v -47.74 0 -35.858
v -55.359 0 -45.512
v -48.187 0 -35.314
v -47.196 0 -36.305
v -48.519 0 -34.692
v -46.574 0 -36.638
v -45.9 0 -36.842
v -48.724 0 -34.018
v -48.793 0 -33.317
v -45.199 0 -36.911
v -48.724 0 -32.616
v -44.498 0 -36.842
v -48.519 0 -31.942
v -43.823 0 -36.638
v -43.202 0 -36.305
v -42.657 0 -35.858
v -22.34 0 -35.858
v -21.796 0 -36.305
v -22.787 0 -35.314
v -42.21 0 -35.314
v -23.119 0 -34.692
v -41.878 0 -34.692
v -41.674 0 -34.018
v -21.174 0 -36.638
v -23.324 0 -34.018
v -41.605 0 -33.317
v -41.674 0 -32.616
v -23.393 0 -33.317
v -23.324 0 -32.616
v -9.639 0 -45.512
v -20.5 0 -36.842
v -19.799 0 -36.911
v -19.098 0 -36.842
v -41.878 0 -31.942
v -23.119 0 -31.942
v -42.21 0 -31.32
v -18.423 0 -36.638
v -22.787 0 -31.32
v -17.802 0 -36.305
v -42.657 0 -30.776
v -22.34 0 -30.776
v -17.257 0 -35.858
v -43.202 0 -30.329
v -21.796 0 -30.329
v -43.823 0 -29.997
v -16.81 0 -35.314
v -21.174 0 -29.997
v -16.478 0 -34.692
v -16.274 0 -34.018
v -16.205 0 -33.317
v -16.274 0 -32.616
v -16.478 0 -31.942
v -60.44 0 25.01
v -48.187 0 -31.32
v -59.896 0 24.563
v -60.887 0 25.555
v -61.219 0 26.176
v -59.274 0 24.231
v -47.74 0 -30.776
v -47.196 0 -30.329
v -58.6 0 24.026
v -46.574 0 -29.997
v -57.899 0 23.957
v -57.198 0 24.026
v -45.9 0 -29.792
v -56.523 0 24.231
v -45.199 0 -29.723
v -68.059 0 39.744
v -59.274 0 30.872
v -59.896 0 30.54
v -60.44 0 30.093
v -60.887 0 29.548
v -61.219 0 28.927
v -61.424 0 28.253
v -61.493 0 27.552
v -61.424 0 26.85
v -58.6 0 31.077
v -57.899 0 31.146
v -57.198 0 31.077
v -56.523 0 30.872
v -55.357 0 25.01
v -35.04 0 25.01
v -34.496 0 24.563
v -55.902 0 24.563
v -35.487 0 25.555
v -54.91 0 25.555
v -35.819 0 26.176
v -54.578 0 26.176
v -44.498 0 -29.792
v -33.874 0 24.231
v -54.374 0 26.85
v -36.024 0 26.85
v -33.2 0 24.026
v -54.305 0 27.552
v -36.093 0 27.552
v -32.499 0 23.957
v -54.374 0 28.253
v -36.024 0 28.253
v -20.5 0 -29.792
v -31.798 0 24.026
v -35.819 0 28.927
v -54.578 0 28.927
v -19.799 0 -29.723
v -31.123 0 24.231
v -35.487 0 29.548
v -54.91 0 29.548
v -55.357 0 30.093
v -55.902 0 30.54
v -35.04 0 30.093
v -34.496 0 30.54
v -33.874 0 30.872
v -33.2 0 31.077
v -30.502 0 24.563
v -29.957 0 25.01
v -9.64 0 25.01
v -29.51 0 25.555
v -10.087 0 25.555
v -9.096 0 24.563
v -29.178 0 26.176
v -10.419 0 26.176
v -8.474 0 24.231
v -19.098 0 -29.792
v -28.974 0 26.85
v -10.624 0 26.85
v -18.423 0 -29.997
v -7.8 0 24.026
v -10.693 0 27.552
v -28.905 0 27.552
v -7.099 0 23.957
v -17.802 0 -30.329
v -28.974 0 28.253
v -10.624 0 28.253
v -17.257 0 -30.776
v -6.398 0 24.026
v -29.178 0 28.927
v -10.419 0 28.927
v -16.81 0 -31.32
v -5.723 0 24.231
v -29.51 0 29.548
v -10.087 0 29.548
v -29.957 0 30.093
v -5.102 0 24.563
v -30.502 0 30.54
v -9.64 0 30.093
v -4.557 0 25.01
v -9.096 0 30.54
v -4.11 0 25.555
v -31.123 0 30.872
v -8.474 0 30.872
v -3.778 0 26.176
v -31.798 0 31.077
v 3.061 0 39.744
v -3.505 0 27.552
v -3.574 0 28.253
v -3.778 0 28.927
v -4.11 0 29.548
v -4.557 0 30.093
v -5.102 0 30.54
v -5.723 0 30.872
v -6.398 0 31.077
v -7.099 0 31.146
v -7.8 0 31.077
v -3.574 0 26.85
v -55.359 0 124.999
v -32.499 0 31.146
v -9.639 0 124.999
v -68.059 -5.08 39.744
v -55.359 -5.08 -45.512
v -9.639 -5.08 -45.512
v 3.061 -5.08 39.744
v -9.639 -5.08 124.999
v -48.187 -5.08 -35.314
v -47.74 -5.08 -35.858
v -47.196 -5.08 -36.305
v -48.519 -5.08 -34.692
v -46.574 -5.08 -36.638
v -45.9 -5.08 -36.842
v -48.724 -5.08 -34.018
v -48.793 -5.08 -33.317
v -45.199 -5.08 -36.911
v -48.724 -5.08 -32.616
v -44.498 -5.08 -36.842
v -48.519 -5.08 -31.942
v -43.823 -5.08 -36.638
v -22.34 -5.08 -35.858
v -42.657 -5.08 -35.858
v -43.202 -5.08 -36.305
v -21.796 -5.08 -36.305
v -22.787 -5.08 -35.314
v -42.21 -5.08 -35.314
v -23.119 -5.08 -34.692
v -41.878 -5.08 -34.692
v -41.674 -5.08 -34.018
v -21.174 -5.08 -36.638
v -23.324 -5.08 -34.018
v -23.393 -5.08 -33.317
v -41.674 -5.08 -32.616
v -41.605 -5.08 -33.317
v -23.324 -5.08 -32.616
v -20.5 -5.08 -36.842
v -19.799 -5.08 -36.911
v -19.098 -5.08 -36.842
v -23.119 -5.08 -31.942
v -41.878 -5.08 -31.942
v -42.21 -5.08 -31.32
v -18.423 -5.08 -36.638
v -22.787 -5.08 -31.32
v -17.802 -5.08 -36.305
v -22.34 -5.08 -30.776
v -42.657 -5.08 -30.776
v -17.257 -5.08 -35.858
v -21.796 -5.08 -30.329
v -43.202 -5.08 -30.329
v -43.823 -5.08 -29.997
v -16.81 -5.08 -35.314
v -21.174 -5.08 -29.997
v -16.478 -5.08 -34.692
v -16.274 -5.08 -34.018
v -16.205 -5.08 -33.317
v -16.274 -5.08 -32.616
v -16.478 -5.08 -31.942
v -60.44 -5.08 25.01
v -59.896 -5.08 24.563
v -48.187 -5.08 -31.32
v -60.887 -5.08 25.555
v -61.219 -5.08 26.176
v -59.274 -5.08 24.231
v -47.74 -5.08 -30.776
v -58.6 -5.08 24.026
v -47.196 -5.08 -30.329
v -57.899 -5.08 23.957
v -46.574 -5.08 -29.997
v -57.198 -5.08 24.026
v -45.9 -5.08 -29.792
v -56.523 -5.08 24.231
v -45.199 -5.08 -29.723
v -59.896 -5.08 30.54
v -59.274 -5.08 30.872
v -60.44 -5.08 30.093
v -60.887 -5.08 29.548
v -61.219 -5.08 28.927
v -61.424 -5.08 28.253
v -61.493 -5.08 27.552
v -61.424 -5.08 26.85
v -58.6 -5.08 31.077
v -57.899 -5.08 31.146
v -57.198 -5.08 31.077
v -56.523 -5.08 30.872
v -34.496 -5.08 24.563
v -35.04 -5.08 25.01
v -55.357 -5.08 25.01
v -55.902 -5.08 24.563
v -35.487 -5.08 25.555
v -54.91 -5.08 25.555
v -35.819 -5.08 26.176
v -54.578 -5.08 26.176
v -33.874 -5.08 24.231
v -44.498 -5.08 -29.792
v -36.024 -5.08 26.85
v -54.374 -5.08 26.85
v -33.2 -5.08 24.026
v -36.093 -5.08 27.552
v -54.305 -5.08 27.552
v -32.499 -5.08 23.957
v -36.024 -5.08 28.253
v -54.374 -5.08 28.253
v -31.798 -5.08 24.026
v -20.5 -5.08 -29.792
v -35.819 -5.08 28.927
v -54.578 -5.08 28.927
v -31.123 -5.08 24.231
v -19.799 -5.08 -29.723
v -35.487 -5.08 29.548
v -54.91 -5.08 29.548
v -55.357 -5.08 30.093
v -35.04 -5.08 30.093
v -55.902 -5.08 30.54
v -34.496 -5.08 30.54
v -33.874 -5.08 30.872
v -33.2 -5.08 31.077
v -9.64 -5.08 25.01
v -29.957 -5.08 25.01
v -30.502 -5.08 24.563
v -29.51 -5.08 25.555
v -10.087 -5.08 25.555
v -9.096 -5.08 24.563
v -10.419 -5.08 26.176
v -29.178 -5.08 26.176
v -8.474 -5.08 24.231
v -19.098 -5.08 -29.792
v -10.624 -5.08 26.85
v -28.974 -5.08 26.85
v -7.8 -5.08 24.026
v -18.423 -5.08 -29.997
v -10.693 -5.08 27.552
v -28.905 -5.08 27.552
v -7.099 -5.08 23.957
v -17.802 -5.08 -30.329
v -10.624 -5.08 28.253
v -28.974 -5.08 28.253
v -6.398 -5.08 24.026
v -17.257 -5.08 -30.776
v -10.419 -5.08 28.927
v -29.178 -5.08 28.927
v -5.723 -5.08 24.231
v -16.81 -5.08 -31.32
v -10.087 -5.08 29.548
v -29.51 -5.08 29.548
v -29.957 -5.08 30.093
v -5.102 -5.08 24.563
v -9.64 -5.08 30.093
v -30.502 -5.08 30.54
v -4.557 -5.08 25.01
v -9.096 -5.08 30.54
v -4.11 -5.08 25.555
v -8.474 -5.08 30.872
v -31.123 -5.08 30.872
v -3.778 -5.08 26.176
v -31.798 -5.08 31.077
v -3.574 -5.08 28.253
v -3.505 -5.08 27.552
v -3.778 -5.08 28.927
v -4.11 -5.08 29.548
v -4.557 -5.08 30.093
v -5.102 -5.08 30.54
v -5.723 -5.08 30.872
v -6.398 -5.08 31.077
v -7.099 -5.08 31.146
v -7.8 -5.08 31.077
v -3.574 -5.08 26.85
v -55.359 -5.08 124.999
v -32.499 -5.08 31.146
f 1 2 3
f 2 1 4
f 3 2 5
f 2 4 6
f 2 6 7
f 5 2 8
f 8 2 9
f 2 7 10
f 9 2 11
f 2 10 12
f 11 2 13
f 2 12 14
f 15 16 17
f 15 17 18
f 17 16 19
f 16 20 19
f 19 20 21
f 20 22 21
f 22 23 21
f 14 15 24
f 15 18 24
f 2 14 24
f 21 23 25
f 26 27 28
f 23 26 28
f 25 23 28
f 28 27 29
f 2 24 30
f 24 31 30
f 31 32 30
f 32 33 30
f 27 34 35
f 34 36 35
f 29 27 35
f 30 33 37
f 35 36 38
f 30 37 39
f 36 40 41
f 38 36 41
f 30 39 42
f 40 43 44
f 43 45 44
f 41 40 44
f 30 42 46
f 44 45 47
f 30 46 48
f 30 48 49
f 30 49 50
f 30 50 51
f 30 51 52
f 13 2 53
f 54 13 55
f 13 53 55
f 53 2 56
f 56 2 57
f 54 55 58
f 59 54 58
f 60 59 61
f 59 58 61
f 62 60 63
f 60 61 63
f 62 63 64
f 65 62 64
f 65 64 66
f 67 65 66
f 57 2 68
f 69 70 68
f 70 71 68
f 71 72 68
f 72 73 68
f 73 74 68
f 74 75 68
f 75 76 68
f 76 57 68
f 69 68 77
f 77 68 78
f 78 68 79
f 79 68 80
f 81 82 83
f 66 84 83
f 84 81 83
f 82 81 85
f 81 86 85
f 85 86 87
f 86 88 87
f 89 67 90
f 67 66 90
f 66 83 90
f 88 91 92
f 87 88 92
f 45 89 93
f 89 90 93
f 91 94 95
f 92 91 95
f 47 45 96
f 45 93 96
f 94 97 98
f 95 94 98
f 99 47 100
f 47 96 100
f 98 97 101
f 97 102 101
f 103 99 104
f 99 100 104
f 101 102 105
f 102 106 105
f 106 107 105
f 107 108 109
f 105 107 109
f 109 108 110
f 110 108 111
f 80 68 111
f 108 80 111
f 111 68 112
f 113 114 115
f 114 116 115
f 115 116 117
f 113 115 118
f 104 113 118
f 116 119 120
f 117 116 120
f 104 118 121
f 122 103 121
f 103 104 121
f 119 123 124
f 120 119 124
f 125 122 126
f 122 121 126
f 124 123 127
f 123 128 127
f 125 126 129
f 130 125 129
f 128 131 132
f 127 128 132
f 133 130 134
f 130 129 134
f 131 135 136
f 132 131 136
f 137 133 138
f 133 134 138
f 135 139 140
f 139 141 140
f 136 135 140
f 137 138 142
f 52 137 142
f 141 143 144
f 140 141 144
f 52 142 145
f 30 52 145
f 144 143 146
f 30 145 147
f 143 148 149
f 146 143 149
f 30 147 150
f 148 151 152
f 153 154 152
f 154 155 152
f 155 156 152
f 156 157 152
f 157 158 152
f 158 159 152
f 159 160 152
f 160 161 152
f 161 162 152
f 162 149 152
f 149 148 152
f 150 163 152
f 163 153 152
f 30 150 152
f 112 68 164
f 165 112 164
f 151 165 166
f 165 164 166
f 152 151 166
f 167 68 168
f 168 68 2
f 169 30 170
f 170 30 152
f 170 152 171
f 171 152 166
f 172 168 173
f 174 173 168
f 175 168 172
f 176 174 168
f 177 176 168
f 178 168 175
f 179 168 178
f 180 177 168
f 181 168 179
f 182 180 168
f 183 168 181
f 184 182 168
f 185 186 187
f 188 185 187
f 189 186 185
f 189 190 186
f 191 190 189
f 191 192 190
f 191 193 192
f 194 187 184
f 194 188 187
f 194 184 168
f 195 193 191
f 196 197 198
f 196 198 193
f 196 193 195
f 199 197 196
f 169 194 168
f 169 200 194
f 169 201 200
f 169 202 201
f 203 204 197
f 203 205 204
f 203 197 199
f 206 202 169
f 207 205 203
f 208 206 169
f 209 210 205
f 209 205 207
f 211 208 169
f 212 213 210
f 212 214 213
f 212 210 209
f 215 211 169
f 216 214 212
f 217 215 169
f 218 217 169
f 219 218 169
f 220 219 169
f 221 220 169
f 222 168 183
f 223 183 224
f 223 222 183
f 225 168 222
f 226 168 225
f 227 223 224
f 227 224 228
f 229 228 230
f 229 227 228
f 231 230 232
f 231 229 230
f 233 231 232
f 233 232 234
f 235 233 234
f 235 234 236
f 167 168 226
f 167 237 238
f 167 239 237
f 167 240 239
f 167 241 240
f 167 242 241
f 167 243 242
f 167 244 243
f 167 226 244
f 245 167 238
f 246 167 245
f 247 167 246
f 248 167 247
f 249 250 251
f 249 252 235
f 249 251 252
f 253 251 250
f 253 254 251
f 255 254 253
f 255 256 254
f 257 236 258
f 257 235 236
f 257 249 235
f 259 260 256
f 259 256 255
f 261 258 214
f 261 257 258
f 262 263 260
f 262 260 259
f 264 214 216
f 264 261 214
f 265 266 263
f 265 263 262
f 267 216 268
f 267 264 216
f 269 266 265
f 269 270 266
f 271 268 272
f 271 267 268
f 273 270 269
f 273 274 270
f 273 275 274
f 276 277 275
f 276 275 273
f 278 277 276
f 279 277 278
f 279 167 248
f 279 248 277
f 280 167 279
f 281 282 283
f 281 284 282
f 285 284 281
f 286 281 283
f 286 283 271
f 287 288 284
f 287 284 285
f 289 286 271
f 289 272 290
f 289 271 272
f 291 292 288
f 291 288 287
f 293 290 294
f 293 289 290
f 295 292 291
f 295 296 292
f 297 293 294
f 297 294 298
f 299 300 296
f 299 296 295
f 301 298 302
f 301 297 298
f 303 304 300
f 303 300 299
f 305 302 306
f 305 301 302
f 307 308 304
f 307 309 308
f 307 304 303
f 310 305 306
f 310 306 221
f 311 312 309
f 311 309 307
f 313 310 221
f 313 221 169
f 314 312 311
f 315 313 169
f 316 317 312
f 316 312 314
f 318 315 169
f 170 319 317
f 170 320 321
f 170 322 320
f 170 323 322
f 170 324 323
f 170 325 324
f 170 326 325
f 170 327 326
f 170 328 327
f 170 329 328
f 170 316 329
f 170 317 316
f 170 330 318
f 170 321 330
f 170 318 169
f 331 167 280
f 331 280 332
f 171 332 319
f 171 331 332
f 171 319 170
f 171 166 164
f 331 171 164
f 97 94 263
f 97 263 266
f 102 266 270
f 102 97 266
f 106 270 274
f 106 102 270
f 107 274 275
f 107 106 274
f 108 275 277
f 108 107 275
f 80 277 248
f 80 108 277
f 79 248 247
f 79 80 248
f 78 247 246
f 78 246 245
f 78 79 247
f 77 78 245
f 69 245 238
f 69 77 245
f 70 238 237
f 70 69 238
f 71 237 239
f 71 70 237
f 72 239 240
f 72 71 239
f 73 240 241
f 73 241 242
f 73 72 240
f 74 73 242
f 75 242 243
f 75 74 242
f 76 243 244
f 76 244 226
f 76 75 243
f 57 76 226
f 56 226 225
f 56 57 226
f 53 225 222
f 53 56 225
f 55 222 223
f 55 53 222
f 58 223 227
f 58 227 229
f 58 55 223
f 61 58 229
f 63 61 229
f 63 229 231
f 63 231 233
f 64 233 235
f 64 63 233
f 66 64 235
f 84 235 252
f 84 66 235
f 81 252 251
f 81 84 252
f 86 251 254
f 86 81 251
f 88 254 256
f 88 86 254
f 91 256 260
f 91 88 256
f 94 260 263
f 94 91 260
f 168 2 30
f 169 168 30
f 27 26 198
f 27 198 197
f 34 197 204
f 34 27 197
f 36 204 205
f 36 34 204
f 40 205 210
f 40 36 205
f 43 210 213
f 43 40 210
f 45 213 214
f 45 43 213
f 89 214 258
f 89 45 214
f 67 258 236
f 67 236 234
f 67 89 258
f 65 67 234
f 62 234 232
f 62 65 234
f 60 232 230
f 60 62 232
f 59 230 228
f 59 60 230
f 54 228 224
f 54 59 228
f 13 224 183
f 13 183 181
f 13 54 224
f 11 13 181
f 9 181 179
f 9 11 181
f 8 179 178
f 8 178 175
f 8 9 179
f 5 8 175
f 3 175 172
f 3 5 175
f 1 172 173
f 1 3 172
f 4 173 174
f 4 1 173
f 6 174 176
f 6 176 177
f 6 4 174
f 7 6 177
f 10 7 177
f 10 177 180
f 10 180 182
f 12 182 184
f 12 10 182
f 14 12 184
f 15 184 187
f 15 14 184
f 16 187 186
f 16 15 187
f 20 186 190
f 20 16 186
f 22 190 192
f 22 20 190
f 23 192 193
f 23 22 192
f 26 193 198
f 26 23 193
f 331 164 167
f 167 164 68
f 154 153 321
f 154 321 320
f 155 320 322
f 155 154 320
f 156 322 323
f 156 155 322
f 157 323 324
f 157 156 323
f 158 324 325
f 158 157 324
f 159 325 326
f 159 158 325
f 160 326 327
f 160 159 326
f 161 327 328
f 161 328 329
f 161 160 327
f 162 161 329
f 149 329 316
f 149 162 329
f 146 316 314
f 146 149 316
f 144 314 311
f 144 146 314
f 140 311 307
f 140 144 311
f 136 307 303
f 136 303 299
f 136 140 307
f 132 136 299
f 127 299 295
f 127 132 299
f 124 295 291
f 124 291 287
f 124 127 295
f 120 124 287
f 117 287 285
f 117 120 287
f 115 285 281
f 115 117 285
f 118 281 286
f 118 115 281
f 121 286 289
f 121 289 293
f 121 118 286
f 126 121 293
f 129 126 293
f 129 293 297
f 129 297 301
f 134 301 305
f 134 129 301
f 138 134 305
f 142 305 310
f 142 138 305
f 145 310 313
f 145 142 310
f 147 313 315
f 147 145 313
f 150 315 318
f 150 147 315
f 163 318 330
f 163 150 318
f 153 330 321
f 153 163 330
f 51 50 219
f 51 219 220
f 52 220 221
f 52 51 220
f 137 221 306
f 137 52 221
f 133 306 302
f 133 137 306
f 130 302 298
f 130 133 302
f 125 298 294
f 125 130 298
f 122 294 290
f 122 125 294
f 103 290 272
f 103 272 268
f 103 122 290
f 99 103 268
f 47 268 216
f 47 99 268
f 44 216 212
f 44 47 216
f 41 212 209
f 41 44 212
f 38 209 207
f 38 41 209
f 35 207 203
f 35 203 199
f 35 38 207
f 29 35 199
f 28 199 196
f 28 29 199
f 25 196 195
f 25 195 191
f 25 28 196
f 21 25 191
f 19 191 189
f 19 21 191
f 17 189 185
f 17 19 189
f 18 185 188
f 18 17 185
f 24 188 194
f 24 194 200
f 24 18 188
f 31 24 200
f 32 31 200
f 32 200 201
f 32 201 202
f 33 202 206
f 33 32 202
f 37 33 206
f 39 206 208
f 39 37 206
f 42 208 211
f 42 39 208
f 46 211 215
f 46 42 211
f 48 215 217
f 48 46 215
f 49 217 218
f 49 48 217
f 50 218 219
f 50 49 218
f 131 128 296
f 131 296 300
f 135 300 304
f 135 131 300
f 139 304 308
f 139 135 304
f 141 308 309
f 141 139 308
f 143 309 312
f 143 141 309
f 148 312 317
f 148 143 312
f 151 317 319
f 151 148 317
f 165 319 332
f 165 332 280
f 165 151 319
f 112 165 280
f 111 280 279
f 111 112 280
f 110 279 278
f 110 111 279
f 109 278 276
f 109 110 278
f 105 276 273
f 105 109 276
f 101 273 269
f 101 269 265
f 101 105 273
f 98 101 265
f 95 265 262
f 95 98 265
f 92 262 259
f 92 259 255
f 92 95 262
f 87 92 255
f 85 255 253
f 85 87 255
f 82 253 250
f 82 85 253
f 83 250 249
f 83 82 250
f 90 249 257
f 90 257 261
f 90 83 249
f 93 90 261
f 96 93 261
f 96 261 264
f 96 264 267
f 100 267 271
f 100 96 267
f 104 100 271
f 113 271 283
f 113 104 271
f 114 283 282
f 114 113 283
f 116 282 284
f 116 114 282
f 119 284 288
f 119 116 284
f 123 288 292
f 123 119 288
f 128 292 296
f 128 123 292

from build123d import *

# Parameters (mm, degrees)
F0_R     = 3.5941
F1_DEPTH = 5.08


with BuildPart() as f1:
    # F0 (on Front) → F1 (new body)
    with BuildSketch(Plane.XZ):
        Polygon((-55.358764, -45.511816), (-45.198764, -45.511816), (-19.798764, -45.511816), (-9.638764, -45.511816), (3.061236, 39.743538), (-9.638764, 124.998892), (-19.798764, 124.998892), (-45.198764, 124.998892), (-55.358764, 124.998892), (-68.058764, 39.743538), align=None)
        with Locations((-45.198764, -33.317022)):
            Circle(F0_R, mode=Mode.SUBTRACT)
        with Locations((-57.898764, 27.551538)):
            Circle(F0_R, mode=Mode.SUBTRACT)
        with Locations((-19.798764, -33.317022)):
            Circle(F0_R, mode=Mode.SUBTRACT)
        with Locations((-32.498764, 27.551538)):
            Circle(F0_R, mode=Mode.SUBTRACT)
        with Locations((-7.098764, 27.551538)):
            Circle(F0_R, mode=Mode.SUBTRACT)
    extrude(amount=F1_DEPTH)


solid = f1.part
